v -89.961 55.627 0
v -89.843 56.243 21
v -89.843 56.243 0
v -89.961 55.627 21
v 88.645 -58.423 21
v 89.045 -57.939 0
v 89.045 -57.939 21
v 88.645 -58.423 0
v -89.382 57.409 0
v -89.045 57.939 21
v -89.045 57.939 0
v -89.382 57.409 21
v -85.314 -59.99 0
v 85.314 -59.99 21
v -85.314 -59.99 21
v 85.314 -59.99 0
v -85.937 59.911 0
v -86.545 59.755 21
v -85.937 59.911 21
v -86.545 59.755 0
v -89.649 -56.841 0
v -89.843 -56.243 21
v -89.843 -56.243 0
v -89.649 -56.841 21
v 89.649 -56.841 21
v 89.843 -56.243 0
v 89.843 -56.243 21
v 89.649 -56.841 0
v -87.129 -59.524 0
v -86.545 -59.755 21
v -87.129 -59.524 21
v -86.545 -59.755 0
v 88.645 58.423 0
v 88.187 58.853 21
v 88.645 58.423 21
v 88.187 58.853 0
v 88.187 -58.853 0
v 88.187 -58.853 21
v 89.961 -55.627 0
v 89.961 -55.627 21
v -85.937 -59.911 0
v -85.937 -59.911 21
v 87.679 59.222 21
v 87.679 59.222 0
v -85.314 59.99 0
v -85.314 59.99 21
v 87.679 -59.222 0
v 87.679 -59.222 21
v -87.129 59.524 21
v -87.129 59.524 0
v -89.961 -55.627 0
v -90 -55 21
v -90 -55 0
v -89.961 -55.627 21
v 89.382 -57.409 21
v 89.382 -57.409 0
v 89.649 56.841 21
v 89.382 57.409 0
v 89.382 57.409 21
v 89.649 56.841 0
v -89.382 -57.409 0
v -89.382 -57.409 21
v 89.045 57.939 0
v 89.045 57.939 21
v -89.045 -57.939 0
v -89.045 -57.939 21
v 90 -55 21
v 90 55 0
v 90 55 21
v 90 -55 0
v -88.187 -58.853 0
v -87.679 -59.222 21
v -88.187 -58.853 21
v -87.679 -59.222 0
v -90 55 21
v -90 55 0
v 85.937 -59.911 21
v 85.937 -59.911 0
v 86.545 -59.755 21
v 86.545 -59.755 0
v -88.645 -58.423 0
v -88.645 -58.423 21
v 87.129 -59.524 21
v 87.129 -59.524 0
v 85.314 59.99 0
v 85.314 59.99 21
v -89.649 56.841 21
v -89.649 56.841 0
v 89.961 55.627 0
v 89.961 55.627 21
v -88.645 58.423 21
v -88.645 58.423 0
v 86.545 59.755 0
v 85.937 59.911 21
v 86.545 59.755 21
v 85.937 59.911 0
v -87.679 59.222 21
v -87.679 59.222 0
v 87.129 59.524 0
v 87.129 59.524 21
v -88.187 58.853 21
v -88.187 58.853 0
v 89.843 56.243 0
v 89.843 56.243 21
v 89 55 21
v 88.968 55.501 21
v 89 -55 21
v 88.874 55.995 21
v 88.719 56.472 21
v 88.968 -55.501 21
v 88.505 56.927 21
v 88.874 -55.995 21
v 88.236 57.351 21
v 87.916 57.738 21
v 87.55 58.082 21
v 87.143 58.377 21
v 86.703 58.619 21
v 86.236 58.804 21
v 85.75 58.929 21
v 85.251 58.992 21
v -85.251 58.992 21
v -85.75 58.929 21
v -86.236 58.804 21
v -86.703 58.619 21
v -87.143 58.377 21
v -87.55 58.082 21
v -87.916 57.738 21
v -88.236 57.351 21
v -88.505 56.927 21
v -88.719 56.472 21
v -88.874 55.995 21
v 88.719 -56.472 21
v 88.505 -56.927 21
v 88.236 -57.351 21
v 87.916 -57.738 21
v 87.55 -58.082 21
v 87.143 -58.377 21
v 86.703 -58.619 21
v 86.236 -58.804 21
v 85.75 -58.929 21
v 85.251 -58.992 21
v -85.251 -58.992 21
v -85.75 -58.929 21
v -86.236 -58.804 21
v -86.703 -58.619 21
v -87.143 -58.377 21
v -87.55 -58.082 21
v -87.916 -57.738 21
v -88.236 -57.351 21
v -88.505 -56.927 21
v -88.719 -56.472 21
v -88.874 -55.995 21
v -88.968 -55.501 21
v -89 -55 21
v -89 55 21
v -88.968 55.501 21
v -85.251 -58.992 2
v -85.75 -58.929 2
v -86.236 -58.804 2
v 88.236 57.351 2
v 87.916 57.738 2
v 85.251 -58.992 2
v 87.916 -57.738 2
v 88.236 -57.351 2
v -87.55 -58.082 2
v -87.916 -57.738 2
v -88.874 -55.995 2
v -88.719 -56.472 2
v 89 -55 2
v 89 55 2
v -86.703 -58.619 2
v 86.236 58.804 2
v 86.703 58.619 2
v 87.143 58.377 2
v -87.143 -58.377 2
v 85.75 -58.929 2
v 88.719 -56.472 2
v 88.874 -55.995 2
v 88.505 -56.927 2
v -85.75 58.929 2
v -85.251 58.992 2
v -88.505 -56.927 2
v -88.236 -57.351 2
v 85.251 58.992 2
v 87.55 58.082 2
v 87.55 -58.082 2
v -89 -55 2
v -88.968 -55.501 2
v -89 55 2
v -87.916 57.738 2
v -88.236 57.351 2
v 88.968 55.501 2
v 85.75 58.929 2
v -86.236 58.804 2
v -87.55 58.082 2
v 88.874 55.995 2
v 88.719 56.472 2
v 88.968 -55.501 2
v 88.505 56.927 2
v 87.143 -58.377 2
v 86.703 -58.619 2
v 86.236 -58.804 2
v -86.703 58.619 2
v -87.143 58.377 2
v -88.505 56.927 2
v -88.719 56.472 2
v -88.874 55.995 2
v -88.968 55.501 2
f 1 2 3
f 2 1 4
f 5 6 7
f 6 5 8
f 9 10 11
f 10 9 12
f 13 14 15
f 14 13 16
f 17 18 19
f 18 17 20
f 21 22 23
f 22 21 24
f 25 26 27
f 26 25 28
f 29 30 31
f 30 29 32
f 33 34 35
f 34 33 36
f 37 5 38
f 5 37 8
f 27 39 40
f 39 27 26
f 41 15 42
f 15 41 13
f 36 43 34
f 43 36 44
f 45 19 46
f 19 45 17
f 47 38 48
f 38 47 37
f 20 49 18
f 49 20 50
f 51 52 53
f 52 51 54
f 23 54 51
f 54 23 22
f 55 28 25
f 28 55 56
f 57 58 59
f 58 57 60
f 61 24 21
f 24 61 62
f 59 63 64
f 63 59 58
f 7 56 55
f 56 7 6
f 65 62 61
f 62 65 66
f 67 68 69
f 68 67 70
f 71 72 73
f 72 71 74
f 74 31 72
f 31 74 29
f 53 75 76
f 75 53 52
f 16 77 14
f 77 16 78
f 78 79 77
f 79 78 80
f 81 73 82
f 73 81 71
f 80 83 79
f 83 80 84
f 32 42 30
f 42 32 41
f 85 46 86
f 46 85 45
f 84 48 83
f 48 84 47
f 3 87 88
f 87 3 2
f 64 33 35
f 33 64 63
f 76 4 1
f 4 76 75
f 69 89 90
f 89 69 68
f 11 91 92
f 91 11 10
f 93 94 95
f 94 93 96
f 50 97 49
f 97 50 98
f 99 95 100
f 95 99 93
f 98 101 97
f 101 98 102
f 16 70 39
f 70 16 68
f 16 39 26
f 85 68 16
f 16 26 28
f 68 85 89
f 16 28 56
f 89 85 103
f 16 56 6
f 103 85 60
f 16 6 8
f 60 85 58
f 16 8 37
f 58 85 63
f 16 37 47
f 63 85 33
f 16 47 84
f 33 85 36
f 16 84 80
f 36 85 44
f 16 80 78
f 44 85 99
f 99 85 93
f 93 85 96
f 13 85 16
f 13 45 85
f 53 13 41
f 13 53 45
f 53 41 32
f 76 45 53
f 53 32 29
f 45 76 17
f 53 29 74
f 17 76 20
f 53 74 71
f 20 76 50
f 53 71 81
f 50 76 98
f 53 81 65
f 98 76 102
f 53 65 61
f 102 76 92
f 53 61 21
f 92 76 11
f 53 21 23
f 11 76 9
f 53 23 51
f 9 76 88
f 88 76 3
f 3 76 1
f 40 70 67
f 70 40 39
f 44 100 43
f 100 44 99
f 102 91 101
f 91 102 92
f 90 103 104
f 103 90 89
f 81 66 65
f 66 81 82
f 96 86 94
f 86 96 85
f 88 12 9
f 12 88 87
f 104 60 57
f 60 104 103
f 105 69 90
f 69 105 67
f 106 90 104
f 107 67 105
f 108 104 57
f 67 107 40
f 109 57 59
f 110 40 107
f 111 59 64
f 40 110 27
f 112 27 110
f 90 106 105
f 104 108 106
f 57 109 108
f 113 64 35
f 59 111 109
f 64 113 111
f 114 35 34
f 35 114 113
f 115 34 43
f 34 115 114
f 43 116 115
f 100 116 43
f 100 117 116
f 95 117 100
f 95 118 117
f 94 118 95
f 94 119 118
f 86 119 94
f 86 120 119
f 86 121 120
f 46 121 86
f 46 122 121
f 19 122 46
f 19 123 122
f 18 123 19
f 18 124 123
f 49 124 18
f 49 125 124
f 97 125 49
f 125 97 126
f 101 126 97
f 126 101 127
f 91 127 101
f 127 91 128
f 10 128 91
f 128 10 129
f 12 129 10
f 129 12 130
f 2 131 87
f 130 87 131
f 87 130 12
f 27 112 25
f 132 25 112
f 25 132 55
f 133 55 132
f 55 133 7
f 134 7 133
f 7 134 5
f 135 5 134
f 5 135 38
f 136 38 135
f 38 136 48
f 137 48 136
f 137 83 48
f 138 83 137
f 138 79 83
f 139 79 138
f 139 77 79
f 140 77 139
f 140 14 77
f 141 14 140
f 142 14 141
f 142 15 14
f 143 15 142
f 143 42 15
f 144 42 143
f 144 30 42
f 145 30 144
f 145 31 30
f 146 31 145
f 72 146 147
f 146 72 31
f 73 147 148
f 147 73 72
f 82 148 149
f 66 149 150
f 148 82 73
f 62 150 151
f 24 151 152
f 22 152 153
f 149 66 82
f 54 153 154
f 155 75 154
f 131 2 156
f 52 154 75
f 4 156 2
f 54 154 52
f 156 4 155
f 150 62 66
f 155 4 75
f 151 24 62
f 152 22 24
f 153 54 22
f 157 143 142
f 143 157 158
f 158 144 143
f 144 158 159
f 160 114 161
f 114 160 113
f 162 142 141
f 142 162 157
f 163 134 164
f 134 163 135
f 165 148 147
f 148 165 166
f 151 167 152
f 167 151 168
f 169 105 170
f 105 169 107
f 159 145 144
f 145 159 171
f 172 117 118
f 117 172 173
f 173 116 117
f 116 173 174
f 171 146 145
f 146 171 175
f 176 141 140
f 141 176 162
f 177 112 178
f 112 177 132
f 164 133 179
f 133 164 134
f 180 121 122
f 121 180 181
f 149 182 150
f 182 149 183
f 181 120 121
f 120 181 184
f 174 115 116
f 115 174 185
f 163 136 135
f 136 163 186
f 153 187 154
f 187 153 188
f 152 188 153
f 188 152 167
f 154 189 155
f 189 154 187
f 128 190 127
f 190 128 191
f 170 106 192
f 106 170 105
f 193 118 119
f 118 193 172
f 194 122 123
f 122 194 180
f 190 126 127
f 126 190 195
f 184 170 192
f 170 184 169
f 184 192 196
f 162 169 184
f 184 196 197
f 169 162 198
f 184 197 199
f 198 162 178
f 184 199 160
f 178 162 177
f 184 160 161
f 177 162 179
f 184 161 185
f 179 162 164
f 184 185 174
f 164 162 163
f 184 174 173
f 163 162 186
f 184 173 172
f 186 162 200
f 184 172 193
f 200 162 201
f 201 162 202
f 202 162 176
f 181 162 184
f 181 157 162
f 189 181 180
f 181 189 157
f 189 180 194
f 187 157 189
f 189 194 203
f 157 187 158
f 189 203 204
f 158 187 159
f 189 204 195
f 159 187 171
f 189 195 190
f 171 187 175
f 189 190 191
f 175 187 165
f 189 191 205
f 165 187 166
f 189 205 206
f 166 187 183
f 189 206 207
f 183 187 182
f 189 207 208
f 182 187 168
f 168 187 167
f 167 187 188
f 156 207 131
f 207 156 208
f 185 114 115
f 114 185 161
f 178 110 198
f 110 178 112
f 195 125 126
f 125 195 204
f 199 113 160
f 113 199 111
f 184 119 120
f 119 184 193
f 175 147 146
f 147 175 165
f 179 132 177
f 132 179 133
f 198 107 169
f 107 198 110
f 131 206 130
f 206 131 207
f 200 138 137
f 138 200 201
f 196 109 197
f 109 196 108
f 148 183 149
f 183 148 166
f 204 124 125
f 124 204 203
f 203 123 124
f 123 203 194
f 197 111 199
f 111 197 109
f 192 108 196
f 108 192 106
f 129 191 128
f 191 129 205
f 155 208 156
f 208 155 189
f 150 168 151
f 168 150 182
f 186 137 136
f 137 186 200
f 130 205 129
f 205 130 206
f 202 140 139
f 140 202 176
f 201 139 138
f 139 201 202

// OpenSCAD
$fn = 50;


difference() {
	union() {
		hull() {
			translate(v = [-85.0000000000, 55.0000000000, 0]) {
				cylinder(h = 21, r = 5);
			}
			translate(v = [85.0000000000, 55.0000000000, 0]) {
				cylinder(h = 21, r = 5);
			}
			translate(v = [-85.0000000000, -55.0000000000, 0]) {
				cylinder(h = 21, r = 5);
			}
			translate(v = [85.0000000000, -55.0000000000, 0]) {
				cylinder(h = 21, r = 5);
			}
		}
	}
	union() {
		translate(v = [0, 0, 2]) {
			hull() {
				translate(v = [-85.0000000000, 55.0000000000, 0]) {
					cylinder(h = 19, r = 4);
				}
				translate(v = [85.0000000000, 55.0000000000, 0]) {
					cylinder(h = 19, r = 4);
				}
				translate(v = [-85.0000000000, -55.0000000000, 0]) {
					cylinder(h = 19, r = 4);
				}
				translate(v = [85.0000000000, -55.0000000000, 0]) {
					cylinder(h = 19, r = 4);
				}
			}
		}
	}
}
